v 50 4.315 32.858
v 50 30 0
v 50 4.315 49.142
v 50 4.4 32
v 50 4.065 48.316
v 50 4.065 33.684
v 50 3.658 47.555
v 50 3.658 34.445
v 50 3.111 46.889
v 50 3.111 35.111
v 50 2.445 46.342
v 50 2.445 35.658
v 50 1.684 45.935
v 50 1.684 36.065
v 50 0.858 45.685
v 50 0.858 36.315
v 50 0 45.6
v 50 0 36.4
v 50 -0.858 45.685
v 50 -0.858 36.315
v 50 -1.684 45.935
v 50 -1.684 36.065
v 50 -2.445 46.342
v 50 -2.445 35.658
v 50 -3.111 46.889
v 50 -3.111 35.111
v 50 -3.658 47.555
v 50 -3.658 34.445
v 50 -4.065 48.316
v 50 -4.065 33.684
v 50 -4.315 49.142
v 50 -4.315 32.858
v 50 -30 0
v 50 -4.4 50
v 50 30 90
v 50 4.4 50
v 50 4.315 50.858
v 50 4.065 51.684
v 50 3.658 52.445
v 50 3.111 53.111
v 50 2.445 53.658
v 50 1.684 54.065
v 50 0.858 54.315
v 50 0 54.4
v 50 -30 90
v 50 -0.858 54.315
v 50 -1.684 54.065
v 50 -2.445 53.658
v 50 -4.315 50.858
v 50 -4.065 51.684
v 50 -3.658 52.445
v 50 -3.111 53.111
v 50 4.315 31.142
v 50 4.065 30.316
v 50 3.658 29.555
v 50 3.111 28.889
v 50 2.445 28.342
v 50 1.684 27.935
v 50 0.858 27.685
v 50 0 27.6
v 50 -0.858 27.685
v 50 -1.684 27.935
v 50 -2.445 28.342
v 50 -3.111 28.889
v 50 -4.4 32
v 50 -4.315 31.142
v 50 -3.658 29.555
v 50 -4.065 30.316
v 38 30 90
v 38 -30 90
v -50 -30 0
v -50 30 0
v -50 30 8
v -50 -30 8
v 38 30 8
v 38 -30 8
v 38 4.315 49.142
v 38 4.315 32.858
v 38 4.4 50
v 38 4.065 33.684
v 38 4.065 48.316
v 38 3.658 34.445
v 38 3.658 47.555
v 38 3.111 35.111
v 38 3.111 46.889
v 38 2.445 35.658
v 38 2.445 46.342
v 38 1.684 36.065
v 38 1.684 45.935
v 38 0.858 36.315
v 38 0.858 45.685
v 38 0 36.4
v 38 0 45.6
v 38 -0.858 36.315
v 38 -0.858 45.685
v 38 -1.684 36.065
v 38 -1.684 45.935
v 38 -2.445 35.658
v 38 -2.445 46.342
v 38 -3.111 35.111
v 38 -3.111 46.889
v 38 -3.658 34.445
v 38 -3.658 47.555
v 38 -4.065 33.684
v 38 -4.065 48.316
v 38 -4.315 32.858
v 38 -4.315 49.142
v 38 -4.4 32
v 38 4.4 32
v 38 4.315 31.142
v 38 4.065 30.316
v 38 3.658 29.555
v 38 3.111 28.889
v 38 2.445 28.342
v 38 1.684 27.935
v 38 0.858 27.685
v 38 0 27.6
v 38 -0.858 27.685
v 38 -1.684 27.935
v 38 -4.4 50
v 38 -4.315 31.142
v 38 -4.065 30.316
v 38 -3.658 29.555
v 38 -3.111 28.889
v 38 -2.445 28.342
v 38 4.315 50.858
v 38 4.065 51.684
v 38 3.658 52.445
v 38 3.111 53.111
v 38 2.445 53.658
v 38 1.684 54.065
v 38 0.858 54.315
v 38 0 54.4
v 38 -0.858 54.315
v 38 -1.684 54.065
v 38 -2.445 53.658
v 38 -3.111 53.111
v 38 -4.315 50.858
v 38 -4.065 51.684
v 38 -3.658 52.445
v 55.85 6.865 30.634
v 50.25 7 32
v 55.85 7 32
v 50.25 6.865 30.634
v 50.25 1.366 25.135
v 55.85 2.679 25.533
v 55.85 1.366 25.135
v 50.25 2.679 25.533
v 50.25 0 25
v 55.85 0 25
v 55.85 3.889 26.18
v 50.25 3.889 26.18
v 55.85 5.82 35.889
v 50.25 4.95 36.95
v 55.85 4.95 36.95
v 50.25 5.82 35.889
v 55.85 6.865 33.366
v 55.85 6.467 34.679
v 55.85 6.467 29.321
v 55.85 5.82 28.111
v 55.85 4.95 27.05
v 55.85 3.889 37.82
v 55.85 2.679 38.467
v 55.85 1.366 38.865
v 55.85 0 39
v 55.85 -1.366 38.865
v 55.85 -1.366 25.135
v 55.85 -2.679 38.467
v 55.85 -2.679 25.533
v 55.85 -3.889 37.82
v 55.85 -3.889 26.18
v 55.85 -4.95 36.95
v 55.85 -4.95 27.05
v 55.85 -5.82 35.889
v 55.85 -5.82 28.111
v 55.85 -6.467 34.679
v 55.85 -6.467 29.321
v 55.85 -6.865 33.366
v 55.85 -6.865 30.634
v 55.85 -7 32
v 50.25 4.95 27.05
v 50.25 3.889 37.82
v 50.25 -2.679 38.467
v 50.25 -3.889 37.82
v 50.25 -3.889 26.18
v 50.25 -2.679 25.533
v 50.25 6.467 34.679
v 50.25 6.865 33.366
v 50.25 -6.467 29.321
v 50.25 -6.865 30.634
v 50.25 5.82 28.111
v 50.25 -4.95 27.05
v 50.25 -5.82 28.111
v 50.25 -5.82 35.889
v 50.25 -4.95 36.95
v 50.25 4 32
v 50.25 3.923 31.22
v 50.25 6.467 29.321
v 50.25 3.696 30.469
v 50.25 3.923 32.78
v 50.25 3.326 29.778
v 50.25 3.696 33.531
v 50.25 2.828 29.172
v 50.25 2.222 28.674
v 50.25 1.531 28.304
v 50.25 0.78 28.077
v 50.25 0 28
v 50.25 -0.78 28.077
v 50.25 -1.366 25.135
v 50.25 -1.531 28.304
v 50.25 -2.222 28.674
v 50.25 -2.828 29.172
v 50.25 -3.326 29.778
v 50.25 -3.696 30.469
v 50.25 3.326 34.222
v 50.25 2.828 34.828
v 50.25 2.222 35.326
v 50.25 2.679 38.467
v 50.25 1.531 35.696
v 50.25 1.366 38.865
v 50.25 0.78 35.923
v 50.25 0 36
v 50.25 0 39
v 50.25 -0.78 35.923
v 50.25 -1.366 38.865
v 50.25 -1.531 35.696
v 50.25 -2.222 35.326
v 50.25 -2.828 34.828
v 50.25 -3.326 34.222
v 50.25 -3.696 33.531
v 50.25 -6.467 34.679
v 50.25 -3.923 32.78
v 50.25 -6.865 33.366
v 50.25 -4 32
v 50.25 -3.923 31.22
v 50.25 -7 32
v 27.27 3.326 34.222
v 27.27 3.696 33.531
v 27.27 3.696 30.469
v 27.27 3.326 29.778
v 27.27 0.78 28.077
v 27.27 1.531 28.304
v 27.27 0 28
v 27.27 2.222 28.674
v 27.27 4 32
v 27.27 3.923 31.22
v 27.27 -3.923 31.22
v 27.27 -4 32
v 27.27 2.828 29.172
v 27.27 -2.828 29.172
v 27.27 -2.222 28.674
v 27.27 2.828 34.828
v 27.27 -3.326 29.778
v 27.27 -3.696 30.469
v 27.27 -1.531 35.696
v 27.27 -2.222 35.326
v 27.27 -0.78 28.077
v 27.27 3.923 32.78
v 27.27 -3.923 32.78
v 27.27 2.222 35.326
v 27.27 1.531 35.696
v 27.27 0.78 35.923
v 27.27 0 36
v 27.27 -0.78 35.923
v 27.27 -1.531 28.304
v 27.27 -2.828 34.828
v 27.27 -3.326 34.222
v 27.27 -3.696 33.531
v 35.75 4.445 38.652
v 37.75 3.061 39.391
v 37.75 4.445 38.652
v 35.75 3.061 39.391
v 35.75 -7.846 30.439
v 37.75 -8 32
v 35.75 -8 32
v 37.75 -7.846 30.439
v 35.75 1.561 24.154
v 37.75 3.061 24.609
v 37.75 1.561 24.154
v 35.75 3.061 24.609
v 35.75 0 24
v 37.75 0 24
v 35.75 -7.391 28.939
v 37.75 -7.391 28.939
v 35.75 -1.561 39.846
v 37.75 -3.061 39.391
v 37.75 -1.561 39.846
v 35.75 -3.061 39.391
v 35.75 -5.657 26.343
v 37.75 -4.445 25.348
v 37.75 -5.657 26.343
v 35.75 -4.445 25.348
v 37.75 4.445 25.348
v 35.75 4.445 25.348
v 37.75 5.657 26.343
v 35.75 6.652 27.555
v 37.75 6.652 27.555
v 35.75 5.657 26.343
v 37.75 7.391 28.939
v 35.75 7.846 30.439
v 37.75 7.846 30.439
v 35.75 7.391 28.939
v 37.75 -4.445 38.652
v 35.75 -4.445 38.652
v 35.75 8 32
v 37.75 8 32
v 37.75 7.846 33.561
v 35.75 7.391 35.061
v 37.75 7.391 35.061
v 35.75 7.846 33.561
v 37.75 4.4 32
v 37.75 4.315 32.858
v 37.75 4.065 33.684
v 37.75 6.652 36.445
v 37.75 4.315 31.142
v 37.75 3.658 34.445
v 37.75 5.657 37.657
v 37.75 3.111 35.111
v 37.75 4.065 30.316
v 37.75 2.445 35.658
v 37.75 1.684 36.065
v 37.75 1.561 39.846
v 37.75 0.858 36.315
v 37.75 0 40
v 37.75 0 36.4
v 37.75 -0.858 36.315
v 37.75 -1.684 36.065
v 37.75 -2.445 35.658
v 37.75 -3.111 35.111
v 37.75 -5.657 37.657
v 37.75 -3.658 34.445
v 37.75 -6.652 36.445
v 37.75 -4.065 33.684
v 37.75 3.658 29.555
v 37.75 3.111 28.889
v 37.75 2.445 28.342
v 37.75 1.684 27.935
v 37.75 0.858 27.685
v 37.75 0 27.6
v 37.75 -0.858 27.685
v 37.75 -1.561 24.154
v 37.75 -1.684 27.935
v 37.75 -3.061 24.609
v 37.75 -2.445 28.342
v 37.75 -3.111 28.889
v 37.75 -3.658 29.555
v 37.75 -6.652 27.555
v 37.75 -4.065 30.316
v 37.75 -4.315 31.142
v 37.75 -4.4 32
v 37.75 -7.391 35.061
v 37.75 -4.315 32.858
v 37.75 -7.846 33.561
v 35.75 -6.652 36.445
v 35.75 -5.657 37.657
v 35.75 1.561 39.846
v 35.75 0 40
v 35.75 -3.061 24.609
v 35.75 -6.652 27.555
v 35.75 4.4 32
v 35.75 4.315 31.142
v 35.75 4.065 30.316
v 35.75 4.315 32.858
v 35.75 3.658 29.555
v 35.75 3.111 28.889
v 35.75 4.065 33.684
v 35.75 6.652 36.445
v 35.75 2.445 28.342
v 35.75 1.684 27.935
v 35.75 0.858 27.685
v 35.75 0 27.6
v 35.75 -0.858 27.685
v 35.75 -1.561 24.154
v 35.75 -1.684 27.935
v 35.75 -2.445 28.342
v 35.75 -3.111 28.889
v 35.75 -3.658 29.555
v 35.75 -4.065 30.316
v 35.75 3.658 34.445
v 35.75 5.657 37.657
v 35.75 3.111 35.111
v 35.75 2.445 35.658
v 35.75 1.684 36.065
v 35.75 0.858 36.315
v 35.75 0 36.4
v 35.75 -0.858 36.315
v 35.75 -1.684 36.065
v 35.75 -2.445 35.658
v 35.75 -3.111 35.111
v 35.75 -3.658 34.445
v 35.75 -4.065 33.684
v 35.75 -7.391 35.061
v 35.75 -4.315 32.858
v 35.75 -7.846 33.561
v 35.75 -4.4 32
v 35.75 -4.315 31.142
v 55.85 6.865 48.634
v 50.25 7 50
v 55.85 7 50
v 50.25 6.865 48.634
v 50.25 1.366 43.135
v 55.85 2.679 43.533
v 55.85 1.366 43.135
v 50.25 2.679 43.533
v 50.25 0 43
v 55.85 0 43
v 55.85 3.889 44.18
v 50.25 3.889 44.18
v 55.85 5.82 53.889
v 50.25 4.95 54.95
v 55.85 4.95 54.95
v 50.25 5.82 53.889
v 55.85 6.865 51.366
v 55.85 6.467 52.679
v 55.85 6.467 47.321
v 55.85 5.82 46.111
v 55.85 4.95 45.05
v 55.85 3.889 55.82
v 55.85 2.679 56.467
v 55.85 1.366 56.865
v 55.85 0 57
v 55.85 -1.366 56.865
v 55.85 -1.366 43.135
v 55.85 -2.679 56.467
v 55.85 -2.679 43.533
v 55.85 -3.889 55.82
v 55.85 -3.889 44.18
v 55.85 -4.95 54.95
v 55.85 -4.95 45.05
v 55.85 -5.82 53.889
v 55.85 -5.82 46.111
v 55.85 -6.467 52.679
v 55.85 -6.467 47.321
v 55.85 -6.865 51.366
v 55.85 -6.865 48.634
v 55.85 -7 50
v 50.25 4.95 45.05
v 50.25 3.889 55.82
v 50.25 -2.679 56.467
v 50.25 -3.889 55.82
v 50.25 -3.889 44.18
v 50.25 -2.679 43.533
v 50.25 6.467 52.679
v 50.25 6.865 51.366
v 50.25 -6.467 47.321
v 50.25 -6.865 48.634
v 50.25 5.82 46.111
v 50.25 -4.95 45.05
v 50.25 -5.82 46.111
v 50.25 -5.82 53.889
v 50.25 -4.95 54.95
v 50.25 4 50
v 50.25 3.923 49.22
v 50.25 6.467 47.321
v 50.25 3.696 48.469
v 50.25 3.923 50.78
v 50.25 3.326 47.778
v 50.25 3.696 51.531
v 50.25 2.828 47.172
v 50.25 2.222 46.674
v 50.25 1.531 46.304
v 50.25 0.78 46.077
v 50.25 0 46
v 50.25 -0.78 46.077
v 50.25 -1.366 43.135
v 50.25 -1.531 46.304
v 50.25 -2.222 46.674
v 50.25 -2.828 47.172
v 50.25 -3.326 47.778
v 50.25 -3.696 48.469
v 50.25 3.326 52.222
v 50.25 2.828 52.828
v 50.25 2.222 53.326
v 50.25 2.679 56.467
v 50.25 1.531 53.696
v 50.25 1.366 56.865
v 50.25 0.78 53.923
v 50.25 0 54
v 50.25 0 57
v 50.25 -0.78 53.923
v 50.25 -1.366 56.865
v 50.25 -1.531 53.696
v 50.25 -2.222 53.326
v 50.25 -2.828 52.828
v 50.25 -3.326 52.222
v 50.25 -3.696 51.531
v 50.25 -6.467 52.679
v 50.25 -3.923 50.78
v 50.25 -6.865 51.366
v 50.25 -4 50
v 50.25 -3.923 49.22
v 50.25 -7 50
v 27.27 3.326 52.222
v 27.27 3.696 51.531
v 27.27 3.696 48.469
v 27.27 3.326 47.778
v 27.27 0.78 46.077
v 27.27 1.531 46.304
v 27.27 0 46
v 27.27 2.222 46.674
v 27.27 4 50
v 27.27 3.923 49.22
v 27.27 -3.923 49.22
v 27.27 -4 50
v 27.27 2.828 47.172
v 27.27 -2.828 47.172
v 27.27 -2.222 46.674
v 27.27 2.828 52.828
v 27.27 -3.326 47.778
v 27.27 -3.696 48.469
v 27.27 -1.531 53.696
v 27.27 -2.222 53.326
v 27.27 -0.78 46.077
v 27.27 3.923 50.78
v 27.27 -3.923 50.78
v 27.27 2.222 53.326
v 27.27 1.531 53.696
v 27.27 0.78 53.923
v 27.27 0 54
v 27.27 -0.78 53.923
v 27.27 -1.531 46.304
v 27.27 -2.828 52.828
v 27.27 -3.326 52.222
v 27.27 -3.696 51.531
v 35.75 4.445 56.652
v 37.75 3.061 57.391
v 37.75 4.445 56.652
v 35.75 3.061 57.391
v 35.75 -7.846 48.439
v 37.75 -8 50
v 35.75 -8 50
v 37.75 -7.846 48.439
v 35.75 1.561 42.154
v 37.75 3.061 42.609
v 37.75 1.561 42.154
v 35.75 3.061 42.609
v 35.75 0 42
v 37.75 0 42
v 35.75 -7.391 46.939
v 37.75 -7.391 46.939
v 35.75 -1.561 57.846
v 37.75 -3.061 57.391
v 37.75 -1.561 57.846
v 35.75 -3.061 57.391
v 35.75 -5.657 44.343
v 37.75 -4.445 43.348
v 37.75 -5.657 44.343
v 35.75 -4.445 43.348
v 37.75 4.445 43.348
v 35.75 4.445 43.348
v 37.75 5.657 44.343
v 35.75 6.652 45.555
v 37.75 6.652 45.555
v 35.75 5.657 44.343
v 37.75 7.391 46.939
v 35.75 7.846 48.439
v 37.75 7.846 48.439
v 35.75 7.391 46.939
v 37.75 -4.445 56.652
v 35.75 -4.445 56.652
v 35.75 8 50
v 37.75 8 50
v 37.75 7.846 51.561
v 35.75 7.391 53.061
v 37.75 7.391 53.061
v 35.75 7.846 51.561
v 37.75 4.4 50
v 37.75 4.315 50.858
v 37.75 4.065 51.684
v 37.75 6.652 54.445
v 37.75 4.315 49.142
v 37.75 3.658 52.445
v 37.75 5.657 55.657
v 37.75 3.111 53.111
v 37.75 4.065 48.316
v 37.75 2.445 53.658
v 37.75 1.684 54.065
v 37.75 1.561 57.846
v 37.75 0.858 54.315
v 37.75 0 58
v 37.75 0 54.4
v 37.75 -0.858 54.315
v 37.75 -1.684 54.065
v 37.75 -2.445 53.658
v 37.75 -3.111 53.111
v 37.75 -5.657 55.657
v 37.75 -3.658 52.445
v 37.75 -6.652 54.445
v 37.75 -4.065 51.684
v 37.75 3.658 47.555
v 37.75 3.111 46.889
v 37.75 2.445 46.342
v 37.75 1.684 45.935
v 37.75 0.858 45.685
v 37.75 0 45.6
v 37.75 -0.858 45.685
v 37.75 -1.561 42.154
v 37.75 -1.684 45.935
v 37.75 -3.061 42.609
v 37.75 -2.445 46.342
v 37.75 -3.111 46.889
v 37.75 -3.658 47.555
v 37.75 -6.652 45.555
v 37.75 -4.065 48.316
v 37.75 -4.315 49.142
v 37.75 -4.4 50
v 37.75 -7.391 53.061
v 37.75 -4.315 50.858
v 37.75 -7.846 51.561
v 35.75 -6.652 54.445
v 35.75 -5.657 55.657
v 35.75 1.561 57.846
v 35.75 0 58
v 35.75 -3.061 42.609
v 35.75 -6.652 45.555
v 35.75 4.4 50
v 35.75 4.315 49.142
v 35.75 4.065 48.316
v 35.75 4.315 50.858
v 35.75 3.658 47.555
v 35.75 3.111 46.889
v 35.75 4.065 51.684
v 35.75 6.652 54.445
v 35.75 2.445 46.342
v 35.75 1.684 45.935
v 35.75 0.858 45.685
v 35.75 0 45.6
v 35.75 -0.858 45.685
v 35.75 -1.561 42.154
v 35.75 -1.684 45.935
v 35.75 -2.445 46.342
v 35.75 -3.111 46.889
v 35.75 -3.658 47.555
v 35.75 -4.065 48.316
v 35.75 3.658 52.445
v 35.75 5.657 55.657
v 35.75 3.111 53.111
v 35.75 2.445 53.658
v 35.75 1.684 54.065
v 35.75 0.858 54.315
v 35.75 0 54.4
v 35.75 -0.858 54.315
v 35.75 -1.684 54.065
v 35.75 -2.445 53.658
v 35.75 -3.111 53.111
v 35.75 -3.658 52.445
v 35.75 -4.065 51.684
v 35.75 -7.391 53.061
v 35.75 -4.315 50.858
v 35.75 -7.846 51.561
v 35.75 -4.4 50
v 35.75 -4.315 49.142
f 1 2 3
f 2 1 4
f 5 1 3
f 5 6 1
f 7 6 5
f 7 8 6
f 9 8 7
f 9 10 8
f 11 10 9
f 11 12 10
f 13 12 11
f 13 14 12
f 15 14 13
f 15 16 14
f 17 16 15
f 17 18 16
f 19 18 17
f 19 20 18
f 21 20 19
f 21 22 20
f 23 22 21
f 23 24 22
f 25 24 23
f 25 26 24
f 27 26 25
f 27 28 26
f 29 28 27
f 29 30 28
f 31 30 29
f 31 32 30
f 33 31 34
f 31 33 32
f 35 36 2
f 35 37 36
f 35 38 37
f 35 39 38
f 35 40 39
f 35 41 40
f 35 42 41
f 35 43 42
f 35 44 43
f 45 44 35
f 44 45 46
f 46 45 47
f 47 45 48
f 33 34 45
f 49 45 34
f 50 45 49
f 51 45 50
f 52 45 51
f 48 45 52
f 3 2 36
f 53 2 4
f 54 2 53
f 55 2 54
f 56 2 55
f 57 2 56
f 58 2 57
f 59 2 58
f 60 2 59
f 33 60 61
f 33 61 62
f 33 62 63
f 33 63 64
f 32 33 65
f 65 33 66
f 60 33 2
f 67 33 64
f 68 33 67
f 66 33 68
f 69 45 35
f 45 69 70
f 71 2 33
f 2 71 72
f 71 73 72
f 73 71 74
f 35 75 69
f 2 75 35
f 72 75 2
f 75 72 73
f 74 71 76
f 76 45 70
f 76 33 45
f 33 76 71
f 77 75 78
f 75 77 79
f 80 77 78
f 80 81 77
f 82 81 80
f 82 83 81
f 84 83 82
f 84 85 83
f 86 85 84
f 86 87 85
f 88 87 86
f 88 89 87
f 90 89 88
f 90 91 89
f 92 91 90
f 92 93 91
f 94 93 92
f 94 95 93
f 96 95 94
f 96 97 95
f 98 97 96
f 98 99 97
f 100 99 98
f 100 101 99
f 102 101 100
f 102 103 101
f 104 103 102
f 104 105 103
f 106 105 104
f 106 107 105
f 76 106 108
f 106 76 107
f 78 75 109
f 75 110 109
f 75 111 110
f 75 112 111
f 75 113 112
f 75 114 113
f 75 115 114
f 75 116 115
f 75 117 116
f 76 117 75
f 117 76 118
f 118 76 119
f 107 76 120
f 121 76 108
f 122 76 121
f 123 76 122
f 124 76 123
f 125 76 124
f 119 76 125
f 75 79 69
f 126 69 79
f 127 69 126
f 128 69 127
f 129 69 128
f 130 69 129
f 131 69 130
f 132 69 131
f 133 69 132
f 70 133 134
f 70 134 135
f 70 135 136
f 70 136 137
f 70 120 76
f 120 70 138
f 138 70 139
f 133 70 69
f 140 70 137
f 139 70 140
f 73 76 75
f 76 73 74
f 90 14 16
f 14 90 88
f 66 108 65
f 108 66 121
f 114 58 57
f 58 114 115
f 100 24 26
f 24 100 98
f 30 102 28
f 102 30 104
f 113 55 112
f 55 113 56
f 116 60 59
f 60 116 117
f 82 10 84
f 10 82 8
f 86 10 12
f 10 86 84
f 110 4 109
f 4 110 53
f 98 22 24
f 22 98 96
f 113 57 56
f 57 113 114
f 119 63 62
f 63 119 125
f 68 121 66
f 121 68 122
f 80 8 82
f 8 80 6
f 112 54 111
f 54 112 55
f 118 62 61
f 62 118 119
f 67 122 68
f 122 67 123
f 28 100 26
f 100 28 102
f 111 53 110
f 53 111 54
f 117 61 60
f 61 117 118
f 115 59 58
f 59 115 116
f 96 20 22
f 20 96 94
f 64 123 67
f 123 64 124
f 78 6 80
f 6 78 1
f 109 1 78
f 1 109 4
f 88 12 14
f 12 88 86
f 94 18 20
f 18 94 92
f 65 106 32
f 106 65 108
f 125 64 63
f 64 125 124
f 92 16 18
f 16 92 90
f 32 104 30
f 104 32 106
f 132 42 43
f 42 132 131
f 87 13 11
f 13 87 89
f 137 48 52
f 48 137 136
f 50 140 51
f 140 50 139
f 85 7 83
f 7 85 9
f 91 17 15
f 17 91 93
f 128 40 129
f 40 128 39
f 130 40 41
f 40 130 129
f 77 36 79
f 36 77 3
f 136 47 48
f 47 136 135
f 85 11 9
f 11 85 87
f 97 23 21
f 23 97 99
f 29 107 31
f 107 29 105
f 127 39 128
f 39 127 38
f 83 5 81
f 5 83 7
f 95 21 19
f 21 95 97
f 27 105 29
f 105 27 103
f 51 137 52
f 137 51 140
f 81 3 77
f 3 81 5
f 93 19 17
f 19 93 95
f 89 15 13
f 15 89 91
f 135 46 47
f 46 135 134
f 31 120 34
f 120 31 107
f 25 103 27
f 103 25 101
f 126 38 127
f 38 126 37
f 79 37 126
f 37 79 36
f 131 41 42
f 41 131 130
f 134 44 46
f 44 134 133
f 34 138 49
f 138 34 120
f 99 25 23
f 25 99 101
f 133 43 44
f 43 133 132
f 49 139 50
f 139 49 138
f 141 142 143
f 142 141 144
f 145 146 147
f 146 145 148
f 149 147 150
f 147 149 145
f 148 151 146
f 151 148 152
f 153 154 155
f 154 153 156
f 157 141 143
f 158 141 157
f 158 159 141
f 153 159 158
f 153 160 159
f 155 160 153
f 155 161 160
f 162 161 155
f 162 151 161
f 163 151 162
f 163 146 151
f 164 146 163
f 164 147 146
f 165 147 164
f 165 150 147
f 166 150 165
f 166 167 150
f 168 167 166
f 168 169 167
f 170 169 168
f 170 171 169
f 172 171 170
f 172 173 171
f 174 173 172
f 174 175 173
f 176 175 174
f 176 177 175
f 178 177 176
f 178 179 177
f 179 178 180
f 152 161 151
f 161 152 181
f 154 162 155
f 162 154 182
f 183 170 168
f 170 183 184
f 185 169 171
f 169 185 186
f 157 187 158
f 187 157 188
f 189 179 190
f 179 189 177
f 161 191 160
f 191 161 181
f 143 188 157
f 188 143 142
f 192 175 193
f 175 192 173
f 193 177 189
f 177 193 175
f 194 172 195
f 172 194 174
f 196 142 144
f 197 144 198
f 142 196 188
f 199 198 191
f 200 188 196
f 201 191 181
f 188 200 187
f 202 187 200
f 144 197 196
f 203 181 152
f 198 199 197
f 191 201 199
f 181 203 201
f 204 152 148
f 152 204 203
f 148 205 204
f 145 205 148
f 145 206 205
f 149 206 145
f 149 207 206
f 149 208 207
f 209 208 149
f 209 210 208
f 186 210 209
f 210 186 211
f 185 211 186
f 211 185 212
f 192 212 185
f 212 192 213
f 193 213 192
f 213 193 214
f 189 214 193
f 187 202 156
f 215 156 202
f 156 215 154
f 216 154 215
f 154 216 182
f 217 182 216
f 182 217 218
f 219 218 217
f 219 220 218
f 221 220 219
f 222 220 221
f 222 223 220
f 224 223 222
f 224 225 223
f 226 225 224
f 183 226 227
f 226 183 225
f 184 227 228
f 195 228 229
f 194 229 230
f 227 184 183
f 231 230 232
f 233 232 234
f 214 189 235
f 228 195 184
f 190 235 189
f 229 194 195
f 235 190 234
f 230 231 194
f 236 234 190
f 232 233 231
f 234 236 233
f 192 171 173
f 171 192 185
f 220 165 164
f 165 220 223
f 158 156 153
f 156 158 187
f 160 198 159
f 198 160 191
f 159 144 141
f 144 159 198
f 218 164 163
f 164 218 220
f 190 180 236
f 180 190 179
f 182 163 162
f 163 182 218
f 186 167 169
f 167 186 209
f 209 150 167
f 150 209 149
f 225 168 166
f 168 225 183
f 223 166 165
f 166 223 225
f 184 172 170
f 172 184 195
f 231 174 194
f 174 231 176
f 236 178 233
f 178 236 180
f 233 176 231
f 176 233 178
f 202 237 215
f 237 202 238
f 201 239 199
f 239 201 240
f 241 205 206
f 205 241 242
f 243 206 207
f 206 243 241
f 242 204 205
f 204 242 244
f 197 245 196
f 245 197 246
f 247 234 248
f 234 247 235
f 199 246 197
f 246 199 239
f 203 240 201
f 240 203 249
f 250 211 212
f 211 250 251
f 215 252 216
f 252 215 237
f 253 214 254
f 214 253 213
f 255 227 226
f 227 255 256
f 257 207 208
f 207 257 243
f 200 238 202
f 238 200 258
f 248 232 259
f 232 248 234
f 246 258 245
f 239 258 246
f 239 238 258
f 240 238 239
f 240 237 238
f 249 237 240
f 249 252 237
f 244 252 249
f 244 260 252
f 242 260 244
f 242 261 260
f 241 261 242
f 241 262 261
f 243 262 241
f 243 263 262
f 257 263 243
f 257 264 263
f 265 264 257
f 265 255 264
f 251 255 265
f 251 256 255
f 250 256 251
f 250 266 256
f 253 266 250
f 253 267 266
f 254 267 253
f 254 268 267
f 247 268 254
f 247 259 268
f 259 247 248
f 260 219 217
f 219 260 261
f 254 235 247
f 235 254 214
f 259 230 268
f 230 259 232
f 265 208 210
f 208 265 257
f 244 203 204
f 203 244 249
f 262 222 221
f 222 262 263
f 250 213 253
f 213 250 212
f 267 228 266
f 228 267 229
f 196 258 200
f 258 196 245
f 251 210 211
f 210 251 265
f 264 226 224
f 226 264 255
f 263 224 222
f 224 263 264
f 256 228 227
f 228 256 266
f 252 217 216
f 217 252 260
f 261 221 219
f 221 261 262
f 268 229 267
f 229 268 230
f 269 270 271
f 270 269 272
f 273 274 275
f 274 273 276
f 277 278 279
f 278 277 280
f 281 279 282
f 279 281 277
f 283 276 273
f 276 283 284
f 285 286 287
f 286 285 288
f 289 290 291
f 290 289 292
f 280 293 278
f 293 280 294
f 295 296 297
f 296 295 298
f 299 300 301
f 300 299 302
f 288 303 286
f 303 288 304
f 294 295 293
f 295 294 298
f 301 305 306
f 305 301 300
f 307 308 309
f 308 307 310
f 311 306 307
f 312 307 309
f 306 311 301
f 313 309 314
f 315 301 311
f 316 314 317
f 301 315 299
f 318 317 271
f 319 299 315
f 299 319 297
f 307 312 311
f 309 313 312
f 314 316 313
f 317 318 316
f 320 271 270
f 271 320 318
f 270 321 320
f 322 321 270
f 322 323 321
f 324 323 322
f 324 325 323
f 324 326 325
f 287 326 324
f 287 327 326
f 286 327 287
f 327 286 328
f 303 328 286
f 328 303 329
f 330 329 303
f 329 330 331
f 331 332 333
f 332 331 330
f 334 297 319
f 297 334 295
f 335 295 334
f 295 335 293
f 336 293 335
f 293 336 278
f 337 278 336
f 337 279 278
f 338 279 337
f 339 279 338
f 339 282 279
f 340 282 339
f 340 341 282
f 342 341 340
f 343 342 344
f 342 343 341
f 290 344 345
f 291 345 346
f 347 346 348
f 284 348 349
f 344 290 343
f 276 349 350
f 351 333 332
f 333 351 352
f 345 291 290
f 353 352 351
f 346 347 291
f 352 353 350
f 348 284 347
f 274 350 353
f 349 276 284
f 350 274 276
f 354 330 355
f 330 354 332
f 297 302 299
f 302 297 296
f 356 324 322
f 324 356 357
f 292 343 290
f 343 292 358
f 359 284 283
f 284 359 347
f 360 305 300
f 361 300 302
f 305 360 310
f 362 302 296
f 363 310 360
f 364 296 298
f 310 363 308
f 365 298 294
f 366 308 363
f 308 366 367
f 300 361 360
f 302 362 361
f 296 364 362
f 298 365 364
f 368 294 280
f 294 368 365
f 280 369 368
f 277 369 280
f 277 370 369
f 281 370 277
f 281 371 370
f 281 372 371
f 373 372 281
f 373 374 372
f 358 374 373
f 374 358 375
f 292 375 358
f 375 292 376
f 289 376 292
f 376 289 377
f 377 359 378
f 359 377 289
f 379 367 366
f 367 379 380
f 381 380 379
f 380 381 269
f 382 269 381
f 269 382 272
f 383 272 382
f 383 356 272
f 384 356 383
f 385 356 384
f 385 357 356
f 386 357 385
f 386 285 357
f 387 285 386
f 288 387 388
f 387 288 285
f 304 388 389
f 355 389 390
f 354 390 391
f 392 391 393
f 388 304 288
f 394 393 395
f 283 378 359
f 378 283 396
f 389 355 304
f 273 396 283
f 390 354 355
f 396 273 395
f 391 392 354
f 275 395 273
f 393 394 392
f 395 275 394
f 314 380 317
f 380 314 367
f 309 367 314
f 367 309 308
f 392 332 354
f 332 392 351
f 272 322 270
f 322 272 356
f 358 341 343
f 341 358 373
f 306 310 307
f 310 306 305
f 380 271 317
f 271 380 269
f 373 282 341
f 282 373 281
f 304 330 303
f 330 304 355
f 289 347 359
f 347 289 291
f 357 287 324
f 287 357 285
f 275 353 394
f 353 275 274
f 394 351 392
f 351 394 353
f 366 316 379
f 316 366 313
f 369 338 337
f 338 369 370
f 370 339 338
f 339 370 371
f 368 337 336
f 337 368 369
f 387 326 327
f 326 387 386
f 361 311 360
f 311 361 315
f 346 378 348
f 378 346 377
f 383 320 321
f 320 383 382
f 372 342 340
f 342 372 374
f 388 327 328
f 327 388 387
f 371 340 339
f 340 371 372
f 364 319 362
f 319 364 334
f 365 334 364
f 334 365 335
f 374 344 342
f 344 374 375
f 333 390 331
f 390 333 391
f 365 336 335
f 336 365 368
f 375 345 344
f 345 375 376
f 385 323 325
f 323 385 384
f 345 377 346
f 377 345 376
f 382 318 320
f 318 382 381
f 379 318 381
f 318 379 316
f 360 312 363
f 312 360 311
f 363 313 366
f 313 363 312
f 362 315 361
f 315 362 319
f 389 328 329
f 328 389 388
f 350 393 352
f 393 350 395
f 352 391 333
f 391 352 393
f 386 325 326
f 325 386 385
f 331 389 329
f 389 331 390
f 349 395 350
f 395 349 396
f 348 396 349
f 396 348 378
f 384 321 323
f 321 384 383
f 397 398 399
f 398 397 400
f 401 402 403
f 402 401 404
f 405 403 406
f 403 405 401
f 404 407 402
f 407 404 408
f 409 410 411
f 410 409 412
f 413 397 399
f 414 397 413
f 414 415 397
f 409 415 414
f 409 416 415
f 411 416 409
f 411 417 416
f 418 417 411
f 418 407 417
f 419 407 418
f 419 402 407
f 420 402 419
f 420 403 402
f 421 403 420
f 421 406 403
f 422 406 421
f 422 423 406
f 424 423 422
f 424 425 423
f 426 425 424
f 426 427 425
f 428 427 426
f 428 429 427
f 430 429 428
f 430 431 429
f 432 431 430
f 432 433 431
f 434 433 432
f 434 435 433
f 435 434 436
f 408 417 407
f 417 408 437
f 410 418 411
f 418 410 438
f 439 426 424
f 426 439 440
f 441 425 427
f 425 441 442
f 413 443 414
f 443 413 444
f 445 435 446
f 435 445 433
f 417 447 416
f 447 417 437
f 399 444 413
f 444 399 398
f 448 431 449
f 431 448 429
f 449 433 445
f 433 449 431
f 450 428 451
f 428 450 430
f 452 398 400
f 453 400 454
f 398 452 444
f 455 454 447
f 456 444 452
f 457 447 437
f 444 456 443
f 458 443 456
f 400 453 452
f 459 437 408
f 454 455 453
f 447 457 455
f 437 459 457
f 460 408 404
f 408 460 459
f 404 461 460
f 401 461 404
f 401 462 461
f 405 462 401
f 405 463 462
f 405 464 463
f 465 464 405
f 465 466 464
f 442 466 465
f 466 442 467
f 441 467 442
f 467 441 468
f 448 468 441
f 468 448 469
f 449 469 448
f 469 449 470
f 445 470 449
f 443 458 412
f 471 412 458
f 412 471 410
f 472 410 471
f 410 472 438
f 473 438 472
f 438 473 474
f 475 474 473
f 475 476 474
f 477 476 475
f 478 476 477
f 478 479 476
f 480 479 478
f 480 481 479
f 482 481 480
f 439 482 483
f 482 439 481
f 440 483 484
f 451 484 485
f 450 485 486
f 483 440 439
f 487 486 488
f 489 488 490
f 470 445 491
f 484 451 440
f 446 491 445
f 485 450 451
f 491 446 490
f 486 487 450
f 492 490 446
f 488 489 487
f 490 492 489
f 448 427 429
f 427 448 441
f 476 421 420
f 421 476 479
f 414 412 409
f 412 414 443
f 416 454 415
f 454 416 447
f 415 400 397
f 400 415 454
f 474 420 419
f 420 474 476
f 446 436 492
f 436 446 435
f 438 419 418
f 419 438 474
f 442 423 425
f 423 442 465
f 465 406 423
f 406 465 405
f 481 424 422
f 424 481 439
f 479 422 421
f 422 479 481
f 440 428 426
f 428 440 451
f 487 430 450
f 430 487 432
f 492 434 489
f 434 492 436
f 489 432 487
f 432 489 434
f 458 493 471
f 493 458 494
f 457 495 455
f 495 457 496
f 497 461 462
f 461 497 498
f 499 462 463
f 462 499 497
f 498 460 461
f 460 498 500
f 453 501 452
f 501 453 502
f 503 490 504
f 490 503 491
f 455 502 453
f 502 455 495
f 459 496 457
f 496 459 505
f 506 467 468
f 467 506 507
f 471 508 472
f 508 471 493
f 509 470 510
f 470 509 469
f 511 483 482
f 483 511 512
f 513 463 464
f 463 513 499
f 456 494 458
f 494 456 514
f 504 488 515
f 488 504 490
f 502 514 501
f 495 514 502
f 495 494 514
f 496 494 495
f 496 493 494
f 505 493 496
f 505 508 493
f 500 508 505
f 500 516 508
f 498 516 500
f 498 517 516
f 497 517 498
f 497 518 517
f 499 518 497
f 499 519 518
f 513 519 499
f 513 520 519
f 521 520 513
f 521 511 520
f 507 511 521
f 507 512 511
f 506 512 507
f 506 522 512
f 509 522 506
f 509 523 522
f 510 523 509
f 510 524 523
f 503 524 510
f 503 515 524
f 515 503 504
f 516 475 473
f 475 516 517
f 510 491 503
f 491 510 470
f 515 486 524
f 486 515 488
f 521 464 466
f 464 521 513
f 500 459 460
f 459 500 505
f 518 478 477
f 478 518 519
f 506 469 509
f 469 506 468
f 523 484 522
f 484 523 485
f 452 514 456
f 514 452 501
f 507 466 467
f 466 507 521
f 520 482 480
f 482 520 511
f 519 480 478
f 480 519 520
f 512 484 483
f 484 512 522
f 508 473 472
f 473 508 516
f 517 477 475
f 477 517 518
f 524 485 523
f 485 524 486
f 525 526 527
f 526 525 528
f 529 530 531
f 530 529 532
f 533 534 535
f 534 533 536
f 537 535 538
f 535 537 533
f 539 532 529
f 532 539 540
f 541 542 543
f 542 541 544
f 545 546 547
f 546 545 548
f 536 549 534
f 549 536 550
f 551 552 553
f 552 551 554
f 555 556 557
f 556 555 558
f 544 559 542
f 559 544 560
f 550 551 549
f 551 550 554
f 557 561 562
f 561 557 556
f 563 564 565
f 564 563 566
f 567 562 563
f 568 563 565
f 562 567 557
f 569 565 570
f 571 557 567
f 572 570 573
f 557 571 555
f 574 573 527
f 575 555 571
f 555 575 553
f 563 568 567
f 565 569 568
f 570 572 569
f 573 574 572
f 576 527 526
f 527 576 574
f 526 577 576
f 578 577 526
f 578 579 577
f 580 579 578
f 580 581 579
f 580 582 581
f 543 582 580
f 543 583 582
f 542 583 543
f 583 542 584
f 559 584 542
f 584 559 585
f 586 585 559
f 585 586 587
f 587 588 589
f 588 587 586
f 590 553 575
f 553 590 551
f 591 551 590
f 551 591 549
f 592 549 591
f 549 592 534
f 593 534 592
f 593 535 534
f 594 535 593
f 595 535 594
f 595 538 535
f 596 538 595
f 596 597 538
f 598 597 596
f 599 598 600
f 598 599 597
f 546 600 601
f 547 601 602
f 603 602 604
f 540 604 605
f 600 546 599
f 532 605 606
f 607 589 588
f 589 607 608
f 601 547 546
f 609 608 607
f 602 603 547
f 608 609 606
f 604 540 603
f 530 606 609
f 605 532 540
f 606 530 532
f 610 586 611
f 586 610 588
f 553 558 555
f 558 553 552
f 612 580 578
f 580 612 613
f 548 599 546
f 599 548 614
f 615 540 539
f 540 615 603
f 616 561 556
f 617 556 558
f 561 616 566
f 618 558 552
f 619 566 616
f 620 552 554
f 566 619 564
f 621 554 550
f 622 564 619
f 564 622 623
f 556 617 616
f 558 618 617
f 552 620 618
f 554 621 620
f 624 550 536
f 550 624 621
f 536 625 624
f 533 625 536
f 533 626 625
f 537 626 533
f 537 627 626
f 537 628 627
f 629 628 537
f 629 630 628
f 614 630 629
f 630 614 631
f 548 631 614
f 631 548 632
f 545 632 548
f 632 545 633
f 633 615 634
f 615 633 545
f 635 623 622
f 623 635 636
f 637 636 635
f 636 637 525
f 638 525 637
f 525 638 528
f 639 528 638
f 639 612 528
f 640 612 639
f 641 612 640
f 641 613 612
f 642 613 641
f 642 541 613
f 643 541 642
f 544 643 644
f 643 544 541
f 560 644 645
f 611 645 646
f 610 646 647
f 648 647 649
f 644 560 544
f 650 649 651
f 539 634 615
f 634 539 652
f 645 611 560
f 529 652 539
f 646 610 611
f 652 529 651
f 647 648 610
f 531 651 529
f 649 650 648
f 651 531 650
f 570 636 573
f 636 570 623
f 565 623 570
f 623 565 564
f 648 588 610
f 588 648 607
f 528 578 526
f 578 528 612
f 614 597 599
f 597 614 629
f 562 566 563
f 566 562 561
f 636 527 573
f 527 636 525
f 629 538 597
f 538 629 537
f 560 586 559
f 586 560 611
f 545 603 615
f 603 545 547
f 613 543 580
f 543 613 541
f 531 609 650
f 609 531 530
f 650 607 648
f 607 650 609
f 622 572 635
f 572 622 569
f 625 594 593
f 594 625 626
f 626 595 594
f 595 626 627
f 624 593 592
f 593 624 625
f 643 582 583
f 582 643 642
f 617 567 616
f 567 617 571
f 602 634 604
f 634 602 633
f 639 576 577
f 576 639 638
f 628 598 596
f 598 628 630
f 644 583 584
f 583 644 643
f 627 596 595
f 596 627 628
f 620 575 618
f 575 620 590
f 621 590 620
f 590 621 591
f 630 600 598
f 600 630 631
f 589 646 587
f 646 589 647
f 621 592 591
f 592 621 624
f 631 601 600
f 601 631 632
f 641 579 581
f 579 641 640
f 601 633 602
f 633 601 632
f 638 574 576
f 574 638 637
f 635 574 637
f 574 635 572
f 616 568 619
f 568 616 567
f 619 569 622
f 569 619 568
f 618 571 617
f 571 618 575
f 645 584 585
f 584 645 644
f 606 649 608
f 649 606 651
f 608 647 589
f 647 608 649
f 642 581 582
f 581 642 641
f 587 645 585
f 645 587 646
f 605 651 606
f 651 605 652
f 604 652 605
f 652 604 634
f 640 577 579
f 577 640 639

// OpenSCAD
$fn = 32;

// ------------------------------------------------------------------------
// Bolted bracket: 100 x 60 mm bracket with 2 bolt joints
// Every part is its own module, assembly() places them once.
// ------------------------------------------------------------------------

// --- part 1 ---
module bracket() {
  difference() {
    translate([-50, -30, 0]) cube([100, 60, 90]);
    translate([-51, -31, 8]) cube([89, 62, 83]);
    translate([44, 0, 32]) rotate([0, 90, 0]) cylinder(h = 14, d = 8.8, center = true);
    translate([44, 0, 50]) rotate([0, 90, 0]) cylinder(h = 14, d = 8.8, center = true);
  }
}

// --- part 2 ---
module bolt1() {
  cylinder(h = 5.6, d = 14);
  translate([0, 0, -22.98]) cylinder(h = 22.98, d = 8);
}

// --- part 3 ---
module washer1() {
  difference() {
      translate([0, 0, 0]) cylinder(h = 2, d = 16);
      translate([0, 0, -1]) cylinder(h = 4, d = 8.8);
    }
}

// --- part 4 ---
module bolt2() {
  cylinder(h = 5.6, d = 14);
  translate([0, 0, -22.98]) cylinder(h = 22.98, d = 8);
}

// --- part 5 ---
module washer2() {
  difference() {
      translate([0, 0, 0]) cylinder(h = 2, d = 16);
      translate([0, 0, -1]) cylinder(h = 4, d = 8.8);
    }
}

// --- assembly ---
module assembly() {
  translate([0, 0, 0]) rotate([0, 0, 0]) bracket();
  translate([50.25, 0, 32]) rotate([0, 90, 0]) bolt1();
  translate([35.75, 0, 32]) rotate([0, 90, 0]) washer1();
  translate([50.25, 0, 50]) rotate([0, 90, 0]) bolt2();
  translate([35.75, 0, 50]) rotate([0, 90, 0]) washer2();
}

assembly();
